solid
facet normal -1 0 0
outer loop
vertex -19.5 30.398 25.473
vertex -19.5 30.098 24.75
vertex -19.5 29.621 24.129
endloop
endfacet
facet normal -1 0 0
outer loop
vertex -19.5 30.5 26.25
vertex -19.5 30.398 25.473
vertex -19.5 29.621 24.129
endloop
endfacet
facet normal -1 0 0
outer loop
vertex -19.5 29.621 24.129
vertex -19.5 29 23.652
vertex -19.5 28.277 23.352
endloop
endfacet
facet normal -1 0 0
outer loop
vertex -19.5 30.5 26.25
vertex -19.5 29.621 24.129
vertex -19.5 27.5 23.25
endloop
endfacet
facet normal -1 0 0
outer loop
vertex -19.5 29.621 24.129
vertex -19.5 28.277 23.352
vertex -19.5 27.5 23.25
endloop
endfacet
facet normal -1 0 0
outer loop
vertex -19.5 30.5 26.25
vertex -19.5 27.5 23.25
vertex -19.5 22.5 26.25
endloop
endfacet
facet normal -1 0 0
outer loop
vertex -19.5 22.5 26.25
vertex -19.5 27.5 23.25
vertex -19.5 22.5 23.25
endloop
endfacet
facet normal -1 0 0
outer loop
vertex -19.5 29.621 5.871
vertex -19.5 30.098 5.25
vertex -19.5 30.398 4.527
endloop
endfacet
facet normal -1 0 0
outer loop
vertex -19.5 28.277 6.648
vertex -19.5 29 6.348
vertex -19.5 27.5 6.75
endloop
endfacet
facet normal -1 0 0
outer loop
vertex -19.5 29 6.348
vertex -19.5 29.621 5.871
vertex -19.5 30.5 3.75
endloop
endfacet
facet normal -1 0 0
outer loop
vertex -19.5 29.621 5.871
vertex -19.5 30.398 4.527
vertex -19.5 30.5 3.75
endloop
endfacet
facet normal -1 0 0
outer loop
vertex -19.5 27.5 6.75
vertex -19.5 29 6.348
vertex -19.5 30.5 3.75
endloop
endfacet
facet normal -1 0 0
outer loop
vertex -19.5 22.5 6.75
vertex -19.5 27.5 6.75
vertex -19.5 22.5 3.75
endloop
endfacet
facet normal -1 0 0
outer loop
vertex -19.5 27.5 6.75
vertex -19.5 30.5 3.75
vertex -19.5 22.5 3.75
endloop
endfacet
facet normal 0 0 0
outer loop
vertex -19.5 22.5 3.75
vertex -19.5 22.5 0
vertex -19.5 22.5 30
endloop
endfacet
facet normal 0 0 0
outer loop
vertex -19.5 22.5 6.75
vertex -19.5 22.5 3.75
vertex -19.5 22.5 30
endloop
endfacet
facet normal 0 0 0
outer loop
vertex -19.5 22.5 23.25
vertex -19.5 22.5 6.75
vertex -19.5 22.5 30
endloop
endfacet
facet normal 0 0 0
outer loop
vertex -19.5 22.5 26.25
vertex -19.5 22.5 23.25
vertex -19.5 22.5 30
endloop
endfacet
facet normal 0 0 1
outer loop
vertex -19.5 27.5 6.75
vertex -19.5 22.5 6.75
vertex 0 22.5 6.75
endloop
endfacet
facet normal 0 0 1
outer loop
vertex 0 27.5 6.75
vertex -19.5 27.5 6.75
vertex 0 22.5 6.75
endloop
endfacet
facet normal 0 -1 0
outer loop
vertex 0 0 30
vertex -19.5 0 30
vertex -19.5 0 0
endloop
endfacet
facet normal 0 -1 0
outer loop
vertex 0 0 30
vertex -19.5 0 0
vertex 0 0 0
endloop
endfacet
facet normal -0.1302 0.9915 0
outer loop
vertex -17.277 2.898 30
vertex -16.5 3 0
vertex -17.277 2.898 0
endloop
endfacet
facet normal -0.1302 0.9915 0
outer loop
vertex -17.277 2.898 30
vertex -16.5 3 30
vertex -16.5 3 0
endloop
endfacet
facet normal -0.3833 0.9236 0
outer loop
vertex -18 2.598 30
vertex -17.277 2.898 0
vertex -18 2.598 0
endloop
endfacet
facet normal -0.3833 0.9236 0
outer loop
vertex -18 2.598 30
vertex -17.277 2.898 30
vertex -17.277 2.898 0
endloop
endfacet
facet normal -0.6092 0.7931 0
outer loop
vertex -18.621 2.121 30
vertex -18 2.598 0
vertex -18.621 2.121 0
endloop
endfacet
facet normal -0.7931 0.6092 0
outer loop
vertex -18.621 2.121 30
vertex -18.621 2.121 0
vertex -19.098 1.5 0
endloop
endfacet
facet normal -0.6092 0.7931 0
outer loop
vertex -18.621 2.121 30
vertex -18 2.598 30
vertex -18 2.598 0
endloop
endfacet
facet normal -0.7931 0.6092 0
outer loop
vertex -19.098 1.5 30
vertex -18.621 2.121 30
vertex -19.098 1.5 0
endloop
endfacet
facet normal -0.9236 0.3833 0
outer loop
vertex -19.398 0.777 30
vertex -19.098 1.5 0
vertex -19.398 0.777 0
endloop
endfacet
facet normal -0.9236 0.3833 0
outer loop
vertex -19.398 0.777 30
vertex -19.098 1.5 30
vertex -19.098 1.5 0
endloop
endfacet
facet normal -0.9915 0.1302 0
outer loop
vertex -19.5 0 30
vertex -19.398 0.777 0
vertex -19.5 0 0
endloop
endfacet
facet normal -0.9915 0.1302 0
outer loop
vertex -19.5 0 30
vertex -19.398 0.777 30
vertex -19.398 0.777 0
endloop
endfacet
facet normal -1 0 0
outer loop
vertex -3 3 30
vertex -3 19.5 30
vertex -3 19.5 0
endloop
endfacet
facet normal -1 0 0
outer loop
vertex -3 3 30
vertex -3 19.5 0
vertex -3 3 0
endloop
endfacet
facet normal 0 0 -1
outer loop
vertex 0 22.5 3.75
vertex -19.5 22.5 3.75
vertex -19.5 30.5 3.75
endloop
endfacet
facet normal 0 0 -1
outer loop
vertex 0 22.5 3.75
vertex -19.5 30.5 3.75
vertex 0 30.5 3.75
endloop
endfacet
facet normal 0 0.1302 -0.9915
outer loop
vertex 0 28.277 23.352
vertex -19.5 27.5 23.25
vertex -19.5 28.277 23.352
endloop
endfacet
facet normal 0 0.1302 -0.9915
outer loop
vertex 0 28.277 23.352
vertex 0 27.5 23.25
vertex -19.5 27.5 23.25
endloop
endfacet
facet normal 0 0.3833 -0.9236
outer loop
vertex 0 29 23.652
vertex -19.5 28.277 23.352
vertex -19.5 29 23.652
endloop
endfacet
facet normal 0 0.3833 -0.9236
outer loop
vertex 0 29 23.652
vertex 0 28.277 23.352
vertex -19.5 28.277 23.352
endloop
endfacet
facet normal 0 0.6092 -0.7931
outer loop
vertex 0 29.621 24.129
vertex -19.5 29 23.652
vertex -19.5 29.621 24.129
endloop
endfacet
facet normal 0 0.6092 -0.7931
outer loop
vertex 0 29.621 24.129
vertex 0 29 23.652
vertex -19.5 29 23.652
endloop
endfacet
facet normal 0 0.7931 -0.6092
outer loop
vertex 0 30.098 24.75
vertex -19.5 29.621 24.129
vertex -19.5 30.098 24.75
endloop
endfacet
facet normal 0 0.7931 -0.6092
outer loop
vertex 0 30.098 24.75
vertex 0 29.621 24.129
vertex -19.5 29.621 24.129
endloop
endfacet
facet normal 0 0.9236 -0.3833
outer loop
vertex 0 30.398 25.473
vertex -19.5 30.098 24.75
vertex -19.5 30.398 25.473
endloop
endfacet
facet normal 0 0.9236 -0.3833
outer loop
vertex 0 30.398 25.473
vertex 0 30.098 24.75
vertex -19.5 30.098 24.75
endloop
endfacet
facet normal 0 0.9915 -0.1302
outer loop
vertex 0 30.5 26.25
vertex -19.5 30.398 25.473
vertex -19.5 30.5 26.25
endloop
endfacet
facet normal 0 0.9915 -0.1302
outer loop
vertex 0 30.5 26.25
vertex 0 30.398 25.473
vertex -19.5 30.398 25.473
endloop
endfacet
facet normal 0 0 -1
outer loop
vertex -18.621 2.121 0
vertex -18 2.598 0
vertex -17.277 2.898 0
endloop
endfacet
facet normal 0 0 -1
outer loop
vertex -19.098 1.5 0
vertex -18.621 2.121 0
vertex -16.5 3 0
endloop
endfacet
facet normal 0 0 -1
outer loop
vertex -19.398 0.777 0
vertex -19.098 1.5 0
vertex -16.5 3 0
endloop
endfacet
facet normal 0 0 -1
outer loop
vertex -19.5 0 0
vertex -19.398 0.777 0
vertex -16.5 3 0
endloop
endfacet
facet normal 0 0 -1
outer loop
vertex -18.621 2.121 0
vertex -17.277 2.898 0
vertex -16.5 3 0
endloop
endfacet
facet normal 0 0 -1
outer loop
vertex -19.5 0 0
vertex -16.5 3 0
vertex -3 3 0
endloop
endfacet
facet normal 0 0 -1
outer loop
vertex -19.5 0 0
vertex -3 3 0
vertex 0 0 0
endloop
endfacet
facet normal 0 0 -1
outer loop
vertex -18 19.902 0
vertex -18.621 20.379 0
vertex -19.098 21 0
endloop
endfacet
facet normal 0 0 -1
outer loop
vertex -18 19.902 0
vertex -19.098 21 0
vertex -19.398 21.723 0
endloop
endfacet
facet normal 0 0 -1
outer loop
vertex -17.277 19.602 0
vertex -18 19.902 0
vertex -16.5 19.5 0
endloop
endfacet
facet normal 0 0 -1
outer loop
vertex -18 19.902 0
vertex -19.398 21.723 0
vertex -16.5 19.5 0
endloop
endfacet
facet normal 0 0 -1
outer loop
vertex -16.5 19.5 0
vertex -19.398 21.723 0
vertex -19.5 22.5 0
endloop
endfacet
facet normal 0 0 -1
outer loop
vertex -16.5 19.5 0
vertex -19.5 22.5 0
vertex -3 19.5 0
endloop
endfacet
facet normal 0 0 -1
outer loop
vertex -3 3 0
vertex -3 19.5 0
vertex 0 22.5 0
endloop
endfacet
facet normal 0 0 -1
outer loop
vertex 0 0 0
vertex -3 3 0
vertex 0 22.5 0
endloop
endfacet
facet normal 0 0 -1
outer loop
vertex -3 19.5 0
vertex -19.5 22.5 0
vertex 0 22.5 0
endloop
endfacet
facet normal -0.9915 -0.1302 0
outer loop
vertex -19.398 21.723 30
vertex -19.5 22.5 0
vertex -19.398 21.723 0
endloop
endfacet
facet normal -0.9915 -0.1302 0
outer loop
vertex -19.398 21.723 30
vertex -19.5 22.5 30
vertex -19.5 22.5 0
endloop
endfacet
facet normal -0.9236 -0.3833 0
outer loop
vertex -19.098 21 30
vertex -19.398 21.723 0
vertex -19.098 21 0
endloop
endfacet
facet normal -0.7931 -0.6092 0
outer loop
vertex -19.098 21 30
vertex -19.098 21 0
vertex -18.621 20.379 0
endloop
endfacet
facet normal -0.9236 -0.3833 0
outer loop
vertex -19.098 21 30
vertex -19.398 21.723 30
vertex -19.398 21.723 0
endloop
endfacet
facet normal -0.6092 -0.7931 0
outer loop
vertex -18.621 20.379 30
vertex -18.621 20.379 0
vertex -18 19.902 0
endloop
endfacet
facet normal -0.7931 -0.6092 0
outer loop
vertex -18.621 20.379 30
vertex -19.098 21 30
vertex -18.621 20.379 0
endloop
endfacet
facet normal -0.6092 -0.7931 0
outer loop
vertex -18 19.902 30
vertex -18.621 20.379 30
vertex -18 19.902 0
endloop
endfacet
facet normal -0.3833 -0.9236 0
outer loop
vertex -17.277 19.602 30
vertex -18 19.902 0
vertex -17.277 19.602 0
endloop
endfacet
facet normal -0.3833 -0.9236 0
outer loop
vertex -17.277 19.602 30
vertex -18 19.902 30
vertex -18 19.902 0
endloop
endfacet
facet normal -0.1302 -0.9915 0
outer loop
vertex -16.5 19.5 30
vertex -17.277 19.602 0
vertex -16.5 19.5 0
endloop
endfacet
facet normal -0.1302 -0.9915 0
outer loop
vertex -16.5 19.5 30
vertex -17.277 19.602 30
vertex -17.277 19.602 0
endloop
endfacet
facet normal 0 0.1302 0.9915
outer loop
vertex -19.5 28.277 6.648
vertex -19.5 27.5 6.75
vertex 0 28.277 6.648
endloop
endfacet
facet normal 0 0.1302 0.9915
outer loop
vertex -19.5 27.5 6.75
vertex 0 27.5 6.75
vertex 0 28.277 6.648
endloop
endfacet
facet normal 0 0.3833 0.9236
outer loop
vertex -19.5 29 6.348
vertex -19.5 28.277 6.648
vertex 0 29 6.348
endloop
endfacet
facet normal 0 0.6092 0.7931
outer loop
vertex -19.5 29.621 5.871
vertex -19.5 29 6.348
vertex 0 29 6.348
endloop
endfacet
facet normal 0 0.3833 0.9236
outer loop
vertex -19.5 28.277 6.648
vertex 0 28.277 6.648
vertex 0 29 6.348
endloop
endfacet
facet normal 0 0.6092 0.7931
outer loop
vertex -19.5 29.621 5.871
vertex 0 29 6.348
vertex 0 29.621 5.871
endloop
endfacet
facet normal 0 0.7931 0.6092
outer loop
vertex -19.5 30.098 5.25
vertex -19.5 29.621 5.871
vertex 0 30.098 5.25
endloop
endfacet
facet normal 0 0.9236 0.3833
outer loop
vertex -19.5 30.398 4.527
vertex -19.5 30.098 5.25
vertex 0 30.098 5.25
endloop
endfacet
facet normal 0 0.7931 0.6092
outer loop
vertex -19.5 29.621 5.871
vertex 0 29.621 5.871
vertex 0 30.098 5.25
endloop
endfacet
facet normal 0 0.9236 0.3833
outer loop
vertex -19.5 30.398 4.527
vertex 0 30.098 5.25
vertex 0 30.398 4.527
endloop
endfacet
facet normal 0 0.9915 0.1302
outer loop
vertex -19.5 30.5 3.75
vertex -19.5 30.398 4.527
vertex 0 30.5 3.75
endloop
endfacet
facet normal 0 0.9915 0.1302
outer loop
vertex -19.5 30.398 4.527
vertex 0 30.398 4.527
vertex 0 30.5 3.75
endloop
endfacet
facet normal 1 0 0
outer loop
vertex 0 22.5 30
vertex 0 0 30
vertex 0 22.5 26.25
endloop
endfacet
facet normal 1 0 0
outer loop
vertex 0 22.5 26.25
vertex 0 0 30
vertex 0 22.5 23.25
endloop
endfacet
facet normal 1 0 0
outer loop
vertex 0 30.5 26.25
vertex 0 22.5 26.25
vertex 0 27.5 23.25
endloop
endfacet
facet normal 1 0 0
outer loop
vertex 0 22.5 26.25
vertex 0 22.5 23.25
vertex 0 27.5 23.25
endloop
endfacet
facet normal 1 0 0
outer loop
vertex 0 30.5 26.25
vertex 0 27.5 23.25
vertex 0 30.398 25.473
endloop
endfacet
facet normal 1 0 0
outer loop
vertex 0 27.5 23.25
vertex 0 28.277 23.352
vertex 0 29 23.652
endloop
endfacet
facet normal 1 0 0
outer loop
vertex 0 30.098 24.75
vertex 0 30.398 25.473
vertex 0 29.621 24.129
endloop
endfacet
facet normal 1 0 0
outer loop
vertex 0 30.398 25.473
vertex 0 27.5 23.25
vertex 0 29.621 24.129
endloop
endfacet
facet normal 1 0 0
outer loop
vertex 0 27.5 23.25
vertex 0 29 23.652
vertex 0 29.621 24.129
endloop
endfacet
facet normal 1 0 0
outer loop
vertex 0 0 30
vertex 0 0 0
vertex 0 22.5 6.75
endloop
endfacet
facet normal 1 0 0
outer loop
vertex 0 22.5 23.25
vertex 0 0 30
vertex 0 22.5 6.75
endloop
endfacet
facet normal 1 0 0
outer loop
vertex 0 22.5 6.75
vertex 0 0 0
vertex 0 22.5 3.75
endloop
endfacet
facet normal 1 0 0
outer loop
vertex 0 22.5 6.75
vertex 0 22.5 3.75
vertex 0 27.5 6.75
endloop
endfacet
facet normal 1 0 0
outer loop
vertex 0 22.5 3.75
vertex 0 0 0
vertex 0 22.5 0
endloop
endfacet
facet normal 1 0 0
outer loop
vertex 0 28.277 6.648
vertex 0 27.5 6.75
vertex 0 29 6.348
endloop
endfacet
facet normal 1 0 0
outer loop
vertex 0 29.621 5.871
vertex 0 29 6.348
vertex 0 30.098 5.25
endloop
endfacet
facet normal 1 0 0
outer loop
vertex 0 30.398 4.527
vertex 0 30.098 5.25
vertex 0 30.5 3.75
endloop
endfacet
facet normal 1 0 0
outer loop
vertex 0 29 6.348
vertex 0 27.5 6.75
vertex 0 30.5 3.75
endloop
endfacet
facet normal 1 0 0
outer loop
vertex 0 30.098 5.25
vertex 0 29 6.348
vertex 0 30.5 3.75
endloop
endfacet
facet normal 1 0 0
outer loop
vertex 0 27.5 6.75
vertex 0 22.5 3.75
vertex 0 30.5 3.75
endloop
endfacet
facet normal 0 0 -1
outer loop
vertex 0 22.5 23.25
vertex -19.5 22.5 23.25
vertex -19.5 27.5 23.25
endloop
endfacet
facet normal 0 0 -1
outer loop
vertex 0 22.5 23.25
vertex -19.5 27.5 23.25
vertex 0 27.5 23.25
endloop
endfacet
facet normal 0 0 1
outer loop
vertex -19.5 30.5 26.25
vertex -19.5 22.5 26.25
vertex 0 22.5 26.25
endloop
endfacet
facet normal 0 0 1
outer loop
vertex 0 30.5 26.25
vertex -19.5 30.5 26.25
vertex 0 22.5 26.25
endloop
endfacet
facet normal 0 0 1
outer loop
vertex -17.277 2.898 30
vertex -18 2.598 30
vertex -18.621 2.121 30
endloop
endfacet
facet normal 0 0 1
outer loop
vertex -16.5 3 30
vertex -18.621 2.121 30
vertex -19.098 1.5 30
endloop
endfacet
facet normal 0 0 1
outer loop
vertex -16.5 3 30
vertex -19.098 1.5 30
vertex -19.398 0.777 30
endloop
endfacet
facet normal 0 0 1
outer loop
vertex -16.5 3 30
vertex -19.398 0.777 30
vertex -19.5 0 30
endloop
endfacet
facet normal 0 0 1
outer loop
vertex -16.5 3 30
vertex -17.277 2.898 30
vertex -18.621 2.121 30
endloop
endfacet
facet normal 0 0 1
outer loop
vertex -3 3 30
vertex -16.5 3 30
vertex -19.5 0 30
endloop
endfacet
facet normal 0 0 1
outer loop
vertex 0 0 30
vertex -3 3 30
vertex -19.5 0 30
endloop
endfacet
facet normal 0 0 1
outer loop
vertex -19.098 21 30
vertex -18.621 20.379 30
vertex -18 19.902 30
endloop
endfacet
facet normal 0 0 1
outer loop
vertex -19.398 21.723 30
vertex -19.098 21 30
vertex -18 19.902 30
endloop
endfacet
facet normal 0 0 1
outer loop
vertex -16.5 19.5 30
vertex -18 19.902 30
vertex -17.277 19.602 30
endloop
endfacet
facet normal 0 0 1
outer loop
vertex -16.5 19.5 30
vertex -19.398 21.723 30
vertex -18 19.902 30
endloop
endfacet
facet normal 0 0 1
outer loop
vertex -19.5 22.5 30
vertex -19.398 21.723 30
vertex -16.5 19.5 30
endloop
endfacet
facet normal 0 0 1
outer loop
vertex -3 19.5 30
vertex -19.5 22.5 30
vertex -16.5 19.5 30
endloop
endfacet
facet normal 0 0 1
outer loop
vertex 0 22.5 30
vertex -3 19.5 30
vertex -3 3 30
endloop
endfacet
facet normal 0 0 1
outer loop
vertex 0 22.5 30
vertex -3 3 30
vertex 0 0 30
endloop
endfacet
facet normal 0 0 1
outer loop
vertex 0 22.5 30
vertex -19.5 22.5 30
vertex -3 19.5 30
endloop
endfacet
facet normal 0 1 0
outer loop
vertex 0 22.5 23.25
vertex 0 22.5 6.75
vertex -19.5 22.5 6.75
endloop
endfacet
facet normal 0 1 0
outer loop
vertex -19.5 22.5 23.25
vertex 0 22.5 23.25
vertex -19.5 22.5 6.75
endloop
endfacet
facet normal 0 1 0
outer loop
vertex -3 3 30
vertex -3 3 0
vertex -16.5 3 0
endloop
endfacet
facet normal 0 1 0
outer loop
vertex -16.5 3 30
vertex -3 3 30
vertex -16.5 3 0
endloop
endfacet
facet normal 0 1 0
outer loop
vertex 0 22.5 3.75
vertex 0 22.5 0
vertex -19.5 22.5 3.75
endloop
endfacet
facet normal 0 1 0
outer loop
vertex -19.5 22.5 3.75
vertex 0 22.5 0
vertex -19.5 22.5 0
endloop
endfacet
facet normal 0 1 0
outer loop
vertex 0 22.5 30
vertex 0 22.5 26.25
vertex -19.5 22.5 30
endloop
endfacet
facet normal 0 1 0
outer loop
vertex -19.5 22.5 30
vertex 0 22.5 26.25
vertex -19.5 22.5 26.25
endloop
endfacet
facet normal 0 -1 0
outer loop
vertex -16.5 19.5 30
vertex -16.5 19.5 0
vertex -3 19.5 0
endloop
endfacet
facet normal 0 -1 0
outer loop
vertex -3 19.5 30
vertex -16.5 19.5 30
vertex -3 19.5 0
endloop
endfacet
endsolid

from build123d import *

# Parameters (mm, degrees)
BOSS_EXTRUDE1_DEPTH = 30
SKETCH2_W           = 19.5
SKETCH2_H           = 3
BOSS_EXTRUDE2_DEPTH = 8
FILLET1_R           = 3
FILLET2_R           = 3
FILLET3_R           = 3
FILLET4_R           = 3


with BuildPart() as part:
    # Sketch1 → Boss-Extrude1 (new body)
    with BuildSketch(Plane.XY):
        Polygon((0, 0), (0, 22.5), (-19.5, 22.5), (-19.5, 19.5), (-3, 19.5), (-3, 3), (-19.5, 3), (-19.5, 0), align=None)
    extrude(amount=BOSS_EXTRUDE1_DEPTH)

    # Sketch2 → Boss-Extrude2 (add)
    with BuildSketch(Plane(origin=(0, 22.5, 0), x_dir=(1, 0, 0), z_dir=(0, 1, 0))):
        with Locations((-9.75, -5.25)):
            Rectangle(SKETCH2_W, SKETCH2_H)
        with Locations((-9.75, -24.75)):
            Rectangle(SKETCH2_W, SKETCH2_H)
    extrude(amount=BOSS_EXTRUDE2_DEPTH)

    # Fillet1
    fillet1_edges = [part.edges().sort_by_distance(p)[0] for p in [
        (-9.75, 30.5, 6.75),
    ]]
    fillet(fillet1_edges, radius=FILLET1_R - 0.0001)  # a hair under: the kernel refuses the full size

    # Fillet2
    fillet2_edges = [part.edges().sort_by_distance(p)[0] for p in [
        (-9.75, 30.5, 23.25),
    ]]
    fillet(fillet2_edges, radius=FILLET2_R - 0.0001)  # a hair under: the kernel refuses the full size

    # Fillet3
    fillet3_edges = [part.edges().sort_by_distance(p)[0] for p in [
        (-19.5, 19.5, 15),
    ]]
    fillet(fillet3_edges, radius=FILLET3_R - 0.0001)  # a hair under: the kernel refuses the full size

    # Fillet4
    fillet4_edges = [part.edges().sort_by_distance(p)[0] for p in [
        (-19.5, 3, 15),
    ]]
    fillet(fillet4_edges, radius=FILLET4_R - 0.0001)  # a hair under: the kernel refuses the full size


solid = part.part
